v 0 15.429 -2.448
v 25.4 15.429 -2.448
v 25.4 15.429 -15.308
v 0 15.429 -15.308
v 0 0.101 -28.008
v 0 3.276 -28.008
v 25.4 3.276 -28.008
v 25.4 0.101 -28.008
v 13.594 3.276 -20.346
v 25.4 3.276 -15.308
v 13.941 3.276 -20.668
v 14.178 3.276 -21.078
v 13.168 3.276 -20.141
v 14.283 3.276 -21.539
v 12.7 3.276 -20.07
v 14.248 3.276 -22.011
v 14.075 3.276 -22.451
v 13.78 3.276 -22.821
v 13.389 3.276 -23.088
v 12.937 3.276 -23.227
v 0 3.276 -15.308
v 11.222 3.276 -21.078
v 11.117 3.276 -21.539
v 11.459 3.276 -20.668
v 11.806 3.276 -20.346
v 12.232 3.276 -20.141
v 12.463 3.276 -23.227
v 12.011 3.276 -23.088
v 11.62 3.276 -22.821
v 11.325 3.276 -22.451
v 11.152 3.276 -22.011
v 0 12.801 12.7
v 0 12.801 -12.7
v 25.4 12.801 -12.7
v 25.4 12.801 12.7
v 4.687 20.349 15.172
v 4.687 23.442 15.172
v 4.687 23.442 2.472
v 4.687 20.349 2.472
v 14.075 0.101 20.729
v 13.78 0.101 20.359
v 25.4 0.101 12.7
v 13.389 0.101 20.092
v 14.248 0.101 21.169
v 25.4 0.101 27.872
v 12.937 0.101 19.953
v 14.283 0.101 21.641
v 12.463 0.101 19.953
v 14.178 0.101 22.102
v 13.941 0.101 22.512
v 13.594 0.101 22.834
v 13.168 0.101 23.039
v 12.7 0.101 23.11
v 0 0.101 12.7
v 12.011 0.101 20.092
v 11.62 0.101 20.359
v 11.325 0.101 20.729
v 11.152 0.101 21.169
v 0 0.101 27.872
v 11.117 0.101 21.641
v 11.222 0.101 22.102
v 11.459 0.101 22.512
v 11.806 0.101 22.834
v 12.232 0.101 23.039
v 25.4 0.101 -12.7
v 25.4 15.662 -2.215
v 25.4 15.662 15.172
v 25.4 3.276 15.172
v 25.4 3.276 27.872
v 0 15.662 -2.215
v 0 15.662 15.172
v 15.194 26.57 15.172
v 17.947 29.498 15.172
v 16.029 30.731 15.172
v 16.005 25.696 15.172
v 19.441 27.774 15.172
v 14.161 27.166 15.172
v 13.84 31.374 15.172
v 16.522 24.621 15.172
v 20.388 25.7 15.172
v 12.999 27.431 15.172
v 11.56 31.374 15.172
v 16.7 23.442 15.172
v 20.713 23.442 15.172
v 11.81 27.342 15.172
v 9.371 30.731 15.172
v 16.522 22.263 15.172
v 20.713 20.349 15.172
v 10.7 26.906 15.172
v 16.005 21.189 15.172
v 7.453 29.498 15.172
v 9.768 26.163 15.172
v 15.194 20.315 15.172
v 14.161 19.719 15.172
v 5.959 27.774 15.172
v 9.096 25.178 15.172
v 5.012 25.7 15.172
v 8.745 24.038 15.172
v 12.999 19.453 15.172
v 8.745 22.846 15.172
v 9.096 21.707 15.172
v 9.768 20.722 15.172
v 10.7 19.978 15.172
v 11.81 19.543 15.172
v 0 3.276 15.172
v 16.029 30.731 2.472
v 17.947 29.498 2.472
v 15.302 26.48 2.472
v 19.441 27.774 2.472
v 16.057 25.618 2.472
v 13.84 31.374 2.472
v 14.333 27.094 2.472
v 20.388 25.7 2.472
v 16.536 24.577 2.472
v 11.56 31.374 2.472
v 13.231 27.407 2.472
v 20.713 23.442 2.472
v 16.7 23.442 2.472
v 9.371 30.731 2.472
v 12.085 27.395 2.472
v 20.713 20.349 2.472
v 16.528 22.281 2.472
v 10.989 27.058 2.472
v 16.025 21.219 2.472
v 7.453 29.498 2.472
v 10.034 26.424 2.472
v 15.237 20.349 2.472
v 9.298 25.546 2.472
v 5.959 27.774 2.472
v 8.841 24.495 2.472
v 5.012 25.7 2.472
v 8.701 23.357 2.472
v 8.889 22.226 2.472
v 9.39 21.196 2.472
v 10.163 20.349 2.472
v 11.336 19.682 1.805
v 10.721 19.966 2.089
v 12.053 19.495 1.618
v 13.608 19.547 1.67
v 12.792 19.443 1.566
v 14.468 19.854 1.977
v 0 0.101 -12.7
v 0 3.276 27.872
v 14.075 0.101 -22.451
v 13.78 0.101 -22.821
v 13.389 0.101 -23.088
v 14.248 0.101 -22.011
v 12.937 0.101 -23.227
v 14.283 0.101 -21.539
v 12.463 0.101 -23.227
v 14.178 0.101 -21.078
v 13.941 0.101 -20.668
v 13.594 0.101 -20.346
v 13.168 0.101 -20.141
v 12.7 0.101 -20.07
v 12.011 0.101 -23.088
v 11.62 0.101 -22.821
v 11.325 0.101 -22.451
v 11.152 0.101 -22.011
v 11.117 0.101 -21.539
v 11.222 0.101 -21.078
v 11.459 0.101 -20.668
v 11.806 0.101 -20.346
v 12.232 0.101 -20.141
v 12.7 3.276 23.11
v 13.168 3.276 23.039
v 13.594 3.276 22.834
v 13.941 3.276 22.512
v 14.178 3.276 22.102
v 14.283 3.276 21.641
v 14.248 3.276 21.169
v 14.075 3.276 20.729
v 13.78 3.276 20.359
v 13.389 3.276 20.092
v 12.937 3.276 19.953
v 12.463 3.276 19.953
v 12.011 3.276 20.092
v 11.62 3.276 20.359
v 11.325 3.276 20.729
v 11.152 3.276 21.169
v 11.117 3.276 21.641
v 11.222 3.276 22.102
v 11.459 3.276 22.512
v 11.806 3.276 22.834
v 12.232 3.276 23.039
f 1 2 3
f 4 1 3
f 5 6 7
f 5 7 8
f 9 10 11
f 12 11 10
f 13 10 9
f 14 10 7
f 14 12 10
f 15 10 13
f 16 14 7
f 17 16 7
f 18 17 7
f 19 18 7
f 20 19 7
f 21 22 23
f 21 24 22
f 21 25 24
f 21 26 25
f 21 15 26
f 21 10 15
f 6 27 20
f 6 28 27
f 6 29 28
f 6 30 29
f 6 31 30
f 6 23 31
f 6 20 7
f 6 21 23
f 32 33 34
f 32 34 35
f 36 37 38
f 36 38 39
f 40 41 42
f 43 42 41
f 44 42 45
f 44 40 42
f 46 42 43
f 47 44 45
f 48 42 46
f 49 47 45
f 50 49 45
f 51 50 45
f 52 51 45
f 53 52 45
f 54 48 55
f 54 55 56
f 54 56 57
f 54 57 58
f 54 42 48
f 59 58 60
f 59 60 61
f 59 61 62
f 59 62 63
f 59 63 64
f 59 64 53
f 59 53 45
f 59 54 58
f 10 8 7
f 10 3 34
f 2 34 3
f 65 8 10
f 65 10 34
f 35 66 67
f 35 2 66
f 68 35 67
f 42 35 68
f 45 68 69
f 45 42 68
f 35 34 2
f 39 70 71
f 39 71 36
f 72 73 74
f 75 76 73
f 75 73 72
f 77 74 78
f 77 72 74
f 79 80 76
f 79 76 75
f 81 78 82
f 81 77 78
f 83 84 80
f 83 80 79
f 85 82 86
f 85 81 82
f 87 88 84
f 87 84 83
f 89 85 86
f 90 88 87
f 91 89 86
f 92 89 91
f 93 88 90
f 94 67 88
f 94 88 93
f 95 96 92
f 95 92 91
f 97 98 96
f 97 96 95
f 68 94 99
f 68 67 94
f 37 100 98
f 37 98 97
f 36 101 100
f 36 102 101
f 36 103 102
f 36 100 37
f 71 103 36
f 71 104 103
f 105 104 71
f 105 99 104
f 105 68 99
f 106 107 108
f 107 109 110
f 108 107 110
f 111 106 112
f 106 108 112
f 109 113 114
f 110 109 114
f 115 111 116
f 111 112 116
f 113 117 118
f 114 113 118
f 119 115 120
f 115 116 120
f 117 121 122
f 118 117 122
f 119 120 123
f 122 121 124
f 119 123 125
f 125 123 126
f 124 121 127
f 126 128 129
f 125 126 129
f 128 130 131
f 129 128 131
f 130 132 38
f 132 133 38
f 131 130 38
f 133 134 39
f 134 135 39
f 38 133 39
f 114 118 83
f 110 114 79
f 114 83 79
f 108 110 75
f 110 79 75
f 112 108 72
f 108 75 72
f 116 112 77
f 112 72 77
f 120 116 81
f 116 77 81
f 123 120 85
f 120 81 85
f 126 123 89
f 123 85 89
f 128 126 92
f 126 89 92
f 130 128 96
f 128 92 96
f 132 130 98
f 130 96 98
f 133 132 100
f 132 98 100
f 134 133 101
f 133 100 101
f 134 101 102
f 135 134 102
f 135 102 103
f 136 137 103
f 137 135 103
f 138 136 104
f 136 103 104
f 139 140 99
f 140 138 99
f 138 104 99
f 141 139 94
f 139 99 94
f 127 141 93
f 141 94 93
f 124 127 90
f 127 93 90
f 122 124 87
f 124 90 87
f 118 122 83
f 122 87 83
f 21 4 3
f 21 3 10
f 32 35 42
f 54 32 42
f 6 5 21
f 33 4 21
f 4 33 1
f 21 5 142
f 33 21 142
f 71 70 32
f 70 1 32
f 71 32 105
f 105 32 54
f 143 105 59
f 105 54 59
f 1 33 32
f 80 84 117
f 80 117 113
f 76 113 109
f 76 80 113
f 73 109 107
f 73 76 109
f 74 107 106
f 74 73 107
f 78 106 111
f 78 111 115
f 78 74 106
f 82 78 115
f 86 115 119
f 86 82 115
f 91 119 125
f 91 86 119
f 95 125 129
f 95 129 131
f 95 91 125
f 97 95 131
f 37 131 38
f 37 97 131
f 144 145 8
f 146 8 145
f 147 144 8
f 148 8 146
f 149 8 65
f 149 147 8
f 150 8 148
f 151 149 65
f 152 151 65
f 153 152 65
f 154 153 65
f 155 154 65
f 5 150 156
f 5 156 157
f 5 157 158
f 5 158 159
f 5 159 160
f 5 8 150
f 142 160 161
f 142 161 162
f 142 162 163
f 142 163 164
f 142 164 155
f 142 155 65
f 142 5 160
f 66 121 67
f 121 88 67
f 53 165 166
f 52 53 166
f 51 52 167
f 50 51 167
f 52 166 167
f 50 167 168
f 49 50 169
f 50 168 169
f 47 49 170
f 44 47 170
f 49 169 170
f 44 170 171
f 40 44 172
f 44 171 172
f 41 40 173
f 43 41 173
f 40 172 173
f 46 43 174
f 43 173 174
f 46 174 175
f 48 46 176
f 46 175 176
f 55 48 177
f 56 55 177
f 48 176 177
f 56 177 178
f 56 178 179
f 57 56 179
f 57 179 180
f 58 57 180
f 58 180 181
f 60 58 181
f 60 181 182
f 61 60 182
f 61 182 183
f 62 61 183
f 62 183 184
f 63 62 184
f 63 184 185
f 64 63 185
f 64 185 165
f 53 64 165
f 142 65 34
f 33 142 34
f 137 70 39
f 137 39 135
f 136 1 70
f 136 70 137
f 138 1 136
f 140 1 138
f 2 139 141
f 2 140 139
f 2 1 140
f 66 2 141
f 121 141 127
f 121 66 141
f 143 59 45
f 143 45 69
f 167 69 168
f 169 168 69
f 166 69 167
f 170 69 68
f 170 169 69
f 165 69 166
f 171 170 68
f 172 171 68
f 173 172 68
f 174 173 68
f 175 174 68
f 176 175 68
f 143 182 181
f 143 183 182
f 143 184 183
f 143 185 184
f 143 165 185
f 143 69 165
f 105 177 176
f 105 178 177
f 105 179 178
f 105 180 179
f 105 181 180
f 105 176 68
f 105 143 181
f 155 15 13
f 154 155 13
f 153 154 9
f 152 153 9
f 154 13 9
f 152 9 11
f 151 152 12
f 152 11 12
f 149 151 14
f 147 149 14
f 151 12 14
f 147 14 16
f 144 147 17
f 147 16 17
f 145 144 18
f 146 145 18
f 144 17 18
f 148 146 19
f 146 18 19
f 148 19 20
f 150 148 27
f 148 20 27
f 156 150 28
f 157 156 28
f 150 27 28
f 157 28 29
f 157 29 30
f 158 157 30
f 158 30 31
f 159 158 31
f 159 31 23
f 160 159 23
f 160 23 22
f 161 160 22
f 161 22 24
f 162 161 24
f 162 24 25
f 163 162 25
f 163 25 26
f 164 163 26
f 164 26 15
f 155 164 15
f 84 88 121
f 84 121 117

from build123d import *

# Parameters (mm, degrees)
BOSS_EXTRUDE1_DEPTH = 25.4
SKETCH2_R           = 4
BOSS_EXTRUDE2_DEPTH = 12.7
CHAMFER1_SIZE       = 4.92
CHAMFER2_SIZE       = 4.92
SKETCH3_R           = 1.5875
CUT_EXTRUDE1_DEPTH  = 12.7


with BuildPart() as part:
    # Sketch1 → Boss-Extrude1 (new body)
    with BuildSketch(Plane(origin=(0, 0, 0), x_dir=(0, 0, -1), z_dir=(1, 0, 0))):
        Polygon((12.7, 12.800996681), (-12.7, 12.800996681), (-12.7, 0.100996681), (-27.872338694, 0.100996681), (-27.872338694, 3.275996681), (-15.172338694, 3.275996681), (-15.172338694, 15.4293954), (15.307661306, 15.4293954), (15.307661306, 3.275996681), (28.007661306, 3.275996681), (28.007661306, 0.100996681), (12.7, 0.100996681), align=None)
    extrude(amount=BOSS_EXTRUDE1_DEPTH)

    # Sketch2 → Boss-Extrude2 (add)
    with BuildSketch(Plane.XY.offset(15.172338694)):
        with BuildLine():
            Line((4.687120924, 23.442274476), (4.687120924, 15.4293954))
            Line((4.687120924, 15.4293954), (20.712879076, 15.4293954))
            Line((20.712879076, 15.4293954), (20.712879076, 23.442274476))
            ThreePointArc((20.712879076, 23.442274476), (12.7, 31.455153552), (4.687120924, 23.442274476))
        make_face()
        with Locations((12.7, 23.442274476)):
            Circle(SKETCH2_R, mode=Mode.SUBTRACT)
    extrude(amount=-BOSS_EXTRUDE2_DEPTH)

    # Chamfer1
    # the kernel refuses this chamfer: 4.92 mm, written as the material it adds along each edge
    with BuildSketch(Plane(origin=(4.687120924, 15.4293954, 15.172338694), x_dir=(-0.9996219169112966, -0.027495876610586726, 0), z_dir=(0, 0, -1))) as chamfer1_piece_1_section:
        Polygon((CHAMFER1_SIZE * 0.999621916911, CHAMFER1_SIZE * 0.0274958766106), (-CHAMFER1_SIZE * 0.0274958766106, CHAMFER1_SIZE * 0.999621916911), (0, 0), align=None)
    chamfer1_piece_1 = extrude(amount=12.7, mode=Mode.PRIVATE)
    chamfer1_piece_1 = split(chamfer1_piece_1, bisect_by=Plane(origin=(0, 17.064795435, 8.822338694), z_dir=(1, 0, 0)), keep=Keep.TOP, mode=Mode.PRIVATE)
    add(chamfer1_piece_1)
    with BuildSketch(Plane(origin=(20.712879076, 15.4293954, 15.172338694), x_dir=(0.9996219169112966, -0.02749587661058674, 0), z_dir=(0, 0, -1))) as chamfer1_piece_2_section:
        Polygon((CHAMFER1_SIZE * 0.999621916911, -CHAMFER1_SIZE * 0.0274958766106), (-CHAMFER1_SIZE * 0.0274958766106, -CHAMFER1_SIZE * 0.999621916911), (0, 0), align=None)
    chamfer1_piece_2 = extrude(amount=12.7, mode=Mode.PRIVATE)
    chamfer1_piece_2 = split(chamfer1_piece_2, bisect_by=Plane(origin=(25.4, 17.064795435, 8.822338694), z_dir=(-1, 0, 0)), keep=Keep.TOP, mode=Mode.PRIVATE)
    add(chamfer1_piece_2)

    # Chamfer2
    # the kernel refuses this chamfer: 4.92 mm, written as the material it adds along each edge
    with BuildSketch(Plane(origin=(25.4, 15.4293954, 2.472338694), x_dir=(0, -0.02749587661026744, -0.9996219169113054), z_dir=(-1, 0, 0))) as chamfer2_piece_1_section:
        Polygon((CHAMFER2_SIZE * 0.999621916911, -CHAMFER2_SIZE * 0.0274958766106), (-CHAMFER2_SIZE * 0.0274958766103, -CHAMFER2_SIZE * 0.999621916911), (0, 0), align=None)
    chamfer2_piece_1 = extrude(amount=25.4, mode=Mode.PRIVATE)
    chamfer2_piece_1 = split(chamfer2_piece_1, bisect_by=Plane(origin=(23.520525821, 17.541748655, 0.607229555), z_dir=(-0.7071067811868302, -0.7071067811862649, 0)), keep=Keep.TOP, mode=Mode.PRIVATE)
    chamfer2_piece_1 = split(chamfer2_piece_1, bisect_by=Plane(origin=(20.712879076, 16.594460185, 0.607229555), z_dir=(1, 0, 0)), keep=Keep.TOP, mode=Mode.PRIVATE)
    add(chamfer2_piece_1)
    with BuildSketch(Plane(origin=(25.4, 15.4293954, 2.472338694), x_dir=(0, -0.02749587661026744, -0.9996219169113054), z_dir=(-1, 0, 0))) as chamfer2_piece_2_section:
        Polygon((CHAMFER2_SIZE * 0.999621916911, -CHAMFER2_SIZE * 0.0274958766106), (-CHAMFER2_SIZE * 0.0274958766103, -CHAMFER2_SIZE * 0.999621916911), (0, 0), align=None)
    chamfer2_piece_2 = extrude(amount=25.4, mode=Mode.PRIVATE)
    chamfer2_piece_2 = split(chamfer2_piece_2, bisect_by=Plane(origin=(7.03196097, 22.694235446, 0.836220955), z_dir=(0.7071067811868302, -0.7071067811862649, 0)), keep=Keep.TOP, mode=Mode.PRIVATE)
    chamfer2_piece_2 = split(chamfer2_piece_2, bisect_by=Plane(origin=(4.687120924, 17.026196416, 0.836220955), z_dir=(1, 0, 0)), keep=Keep.TOP, mode=Mode.PRIVATE)
    chamfer2_piece_2 = split(chamfer2_piece_2, bisect_by=Plane(origin=(20.712879076, 17.026196416, 0.836220955), z_dir=(-1, 0, 0)), keep=Keep.TOP, mode=Mode.PRIVATE)
    chamfer2_piece_2 = chamfer2_piece_2 - Plane(origin=(12.7, 23.442274476, 0.836220955), x_dir=(1, 0, 0), z_dir=(0, 0, 1)) * Cylinder(4, 71, mode=Mode.PRIVATE)
    add(chamfer2_piece_2)
    with BuildSketch(Plane(origin=(25.4, 15.4293954, 2.472338694), x_dir=(0, -0.02749587661026744, -0.9996219169113054), z_dir=(-1, 0, 0))) as chamfer2_piece_3_section:
        Polygon((CHAMFER2_SIZE * 0.999621916911, -CHAMFER2_SIZE * 0.0274958766106), (-CHAMFER2_SIZE * 0.0274958766103, -CHAMFER2_SIZE * 0.999621916911), (0, 0), align=None)
    chamfer2_piece_3 = extrude(amount=25.4, mode=Mode.PRIVATE)
    chamfer2_piece_3 = split(chamfer2_piece_3, bisect_by=Plane(origin=(1.879474179, 17.541748655, 0.607229555), z_dir=(0.7071067811868302, -0.7071067811862649, 0)), keep=Keep.TOP, mode=Mode.PRIVATE)
    chamfer2_piece_3 = split(chamfer2_piece_3, bisect_by=Plane(origin=(4.687120924, 16.594460185, 0.607229555), z_dir=(-1, 0, 0)), keep=Keep.TOP, mode=Mode.PRIVATE)
    add(chamfer2_piece_3)

    # Sketch3 → Cut-Extrude1 (cut)
    with BuildSketch(Plane(origin=(0, 3.275996681, 0), x_dir=(1, 0, 0), z_dir=(0, 1, 0))):
        with Locations(Location((12.7, 21.657661306, 0), (0, 0, 270))):
            Circle(SKETCH3_R)
        with Locations(Location((12.7, -21.522338694, 0), (0, 0, 270))):
            Circle(SKETCH3_R)
    extrude(amount=-CUT_EXTRUDE1_DEPTH, mode=Mode.SUBTRACT)


solid = part.part
